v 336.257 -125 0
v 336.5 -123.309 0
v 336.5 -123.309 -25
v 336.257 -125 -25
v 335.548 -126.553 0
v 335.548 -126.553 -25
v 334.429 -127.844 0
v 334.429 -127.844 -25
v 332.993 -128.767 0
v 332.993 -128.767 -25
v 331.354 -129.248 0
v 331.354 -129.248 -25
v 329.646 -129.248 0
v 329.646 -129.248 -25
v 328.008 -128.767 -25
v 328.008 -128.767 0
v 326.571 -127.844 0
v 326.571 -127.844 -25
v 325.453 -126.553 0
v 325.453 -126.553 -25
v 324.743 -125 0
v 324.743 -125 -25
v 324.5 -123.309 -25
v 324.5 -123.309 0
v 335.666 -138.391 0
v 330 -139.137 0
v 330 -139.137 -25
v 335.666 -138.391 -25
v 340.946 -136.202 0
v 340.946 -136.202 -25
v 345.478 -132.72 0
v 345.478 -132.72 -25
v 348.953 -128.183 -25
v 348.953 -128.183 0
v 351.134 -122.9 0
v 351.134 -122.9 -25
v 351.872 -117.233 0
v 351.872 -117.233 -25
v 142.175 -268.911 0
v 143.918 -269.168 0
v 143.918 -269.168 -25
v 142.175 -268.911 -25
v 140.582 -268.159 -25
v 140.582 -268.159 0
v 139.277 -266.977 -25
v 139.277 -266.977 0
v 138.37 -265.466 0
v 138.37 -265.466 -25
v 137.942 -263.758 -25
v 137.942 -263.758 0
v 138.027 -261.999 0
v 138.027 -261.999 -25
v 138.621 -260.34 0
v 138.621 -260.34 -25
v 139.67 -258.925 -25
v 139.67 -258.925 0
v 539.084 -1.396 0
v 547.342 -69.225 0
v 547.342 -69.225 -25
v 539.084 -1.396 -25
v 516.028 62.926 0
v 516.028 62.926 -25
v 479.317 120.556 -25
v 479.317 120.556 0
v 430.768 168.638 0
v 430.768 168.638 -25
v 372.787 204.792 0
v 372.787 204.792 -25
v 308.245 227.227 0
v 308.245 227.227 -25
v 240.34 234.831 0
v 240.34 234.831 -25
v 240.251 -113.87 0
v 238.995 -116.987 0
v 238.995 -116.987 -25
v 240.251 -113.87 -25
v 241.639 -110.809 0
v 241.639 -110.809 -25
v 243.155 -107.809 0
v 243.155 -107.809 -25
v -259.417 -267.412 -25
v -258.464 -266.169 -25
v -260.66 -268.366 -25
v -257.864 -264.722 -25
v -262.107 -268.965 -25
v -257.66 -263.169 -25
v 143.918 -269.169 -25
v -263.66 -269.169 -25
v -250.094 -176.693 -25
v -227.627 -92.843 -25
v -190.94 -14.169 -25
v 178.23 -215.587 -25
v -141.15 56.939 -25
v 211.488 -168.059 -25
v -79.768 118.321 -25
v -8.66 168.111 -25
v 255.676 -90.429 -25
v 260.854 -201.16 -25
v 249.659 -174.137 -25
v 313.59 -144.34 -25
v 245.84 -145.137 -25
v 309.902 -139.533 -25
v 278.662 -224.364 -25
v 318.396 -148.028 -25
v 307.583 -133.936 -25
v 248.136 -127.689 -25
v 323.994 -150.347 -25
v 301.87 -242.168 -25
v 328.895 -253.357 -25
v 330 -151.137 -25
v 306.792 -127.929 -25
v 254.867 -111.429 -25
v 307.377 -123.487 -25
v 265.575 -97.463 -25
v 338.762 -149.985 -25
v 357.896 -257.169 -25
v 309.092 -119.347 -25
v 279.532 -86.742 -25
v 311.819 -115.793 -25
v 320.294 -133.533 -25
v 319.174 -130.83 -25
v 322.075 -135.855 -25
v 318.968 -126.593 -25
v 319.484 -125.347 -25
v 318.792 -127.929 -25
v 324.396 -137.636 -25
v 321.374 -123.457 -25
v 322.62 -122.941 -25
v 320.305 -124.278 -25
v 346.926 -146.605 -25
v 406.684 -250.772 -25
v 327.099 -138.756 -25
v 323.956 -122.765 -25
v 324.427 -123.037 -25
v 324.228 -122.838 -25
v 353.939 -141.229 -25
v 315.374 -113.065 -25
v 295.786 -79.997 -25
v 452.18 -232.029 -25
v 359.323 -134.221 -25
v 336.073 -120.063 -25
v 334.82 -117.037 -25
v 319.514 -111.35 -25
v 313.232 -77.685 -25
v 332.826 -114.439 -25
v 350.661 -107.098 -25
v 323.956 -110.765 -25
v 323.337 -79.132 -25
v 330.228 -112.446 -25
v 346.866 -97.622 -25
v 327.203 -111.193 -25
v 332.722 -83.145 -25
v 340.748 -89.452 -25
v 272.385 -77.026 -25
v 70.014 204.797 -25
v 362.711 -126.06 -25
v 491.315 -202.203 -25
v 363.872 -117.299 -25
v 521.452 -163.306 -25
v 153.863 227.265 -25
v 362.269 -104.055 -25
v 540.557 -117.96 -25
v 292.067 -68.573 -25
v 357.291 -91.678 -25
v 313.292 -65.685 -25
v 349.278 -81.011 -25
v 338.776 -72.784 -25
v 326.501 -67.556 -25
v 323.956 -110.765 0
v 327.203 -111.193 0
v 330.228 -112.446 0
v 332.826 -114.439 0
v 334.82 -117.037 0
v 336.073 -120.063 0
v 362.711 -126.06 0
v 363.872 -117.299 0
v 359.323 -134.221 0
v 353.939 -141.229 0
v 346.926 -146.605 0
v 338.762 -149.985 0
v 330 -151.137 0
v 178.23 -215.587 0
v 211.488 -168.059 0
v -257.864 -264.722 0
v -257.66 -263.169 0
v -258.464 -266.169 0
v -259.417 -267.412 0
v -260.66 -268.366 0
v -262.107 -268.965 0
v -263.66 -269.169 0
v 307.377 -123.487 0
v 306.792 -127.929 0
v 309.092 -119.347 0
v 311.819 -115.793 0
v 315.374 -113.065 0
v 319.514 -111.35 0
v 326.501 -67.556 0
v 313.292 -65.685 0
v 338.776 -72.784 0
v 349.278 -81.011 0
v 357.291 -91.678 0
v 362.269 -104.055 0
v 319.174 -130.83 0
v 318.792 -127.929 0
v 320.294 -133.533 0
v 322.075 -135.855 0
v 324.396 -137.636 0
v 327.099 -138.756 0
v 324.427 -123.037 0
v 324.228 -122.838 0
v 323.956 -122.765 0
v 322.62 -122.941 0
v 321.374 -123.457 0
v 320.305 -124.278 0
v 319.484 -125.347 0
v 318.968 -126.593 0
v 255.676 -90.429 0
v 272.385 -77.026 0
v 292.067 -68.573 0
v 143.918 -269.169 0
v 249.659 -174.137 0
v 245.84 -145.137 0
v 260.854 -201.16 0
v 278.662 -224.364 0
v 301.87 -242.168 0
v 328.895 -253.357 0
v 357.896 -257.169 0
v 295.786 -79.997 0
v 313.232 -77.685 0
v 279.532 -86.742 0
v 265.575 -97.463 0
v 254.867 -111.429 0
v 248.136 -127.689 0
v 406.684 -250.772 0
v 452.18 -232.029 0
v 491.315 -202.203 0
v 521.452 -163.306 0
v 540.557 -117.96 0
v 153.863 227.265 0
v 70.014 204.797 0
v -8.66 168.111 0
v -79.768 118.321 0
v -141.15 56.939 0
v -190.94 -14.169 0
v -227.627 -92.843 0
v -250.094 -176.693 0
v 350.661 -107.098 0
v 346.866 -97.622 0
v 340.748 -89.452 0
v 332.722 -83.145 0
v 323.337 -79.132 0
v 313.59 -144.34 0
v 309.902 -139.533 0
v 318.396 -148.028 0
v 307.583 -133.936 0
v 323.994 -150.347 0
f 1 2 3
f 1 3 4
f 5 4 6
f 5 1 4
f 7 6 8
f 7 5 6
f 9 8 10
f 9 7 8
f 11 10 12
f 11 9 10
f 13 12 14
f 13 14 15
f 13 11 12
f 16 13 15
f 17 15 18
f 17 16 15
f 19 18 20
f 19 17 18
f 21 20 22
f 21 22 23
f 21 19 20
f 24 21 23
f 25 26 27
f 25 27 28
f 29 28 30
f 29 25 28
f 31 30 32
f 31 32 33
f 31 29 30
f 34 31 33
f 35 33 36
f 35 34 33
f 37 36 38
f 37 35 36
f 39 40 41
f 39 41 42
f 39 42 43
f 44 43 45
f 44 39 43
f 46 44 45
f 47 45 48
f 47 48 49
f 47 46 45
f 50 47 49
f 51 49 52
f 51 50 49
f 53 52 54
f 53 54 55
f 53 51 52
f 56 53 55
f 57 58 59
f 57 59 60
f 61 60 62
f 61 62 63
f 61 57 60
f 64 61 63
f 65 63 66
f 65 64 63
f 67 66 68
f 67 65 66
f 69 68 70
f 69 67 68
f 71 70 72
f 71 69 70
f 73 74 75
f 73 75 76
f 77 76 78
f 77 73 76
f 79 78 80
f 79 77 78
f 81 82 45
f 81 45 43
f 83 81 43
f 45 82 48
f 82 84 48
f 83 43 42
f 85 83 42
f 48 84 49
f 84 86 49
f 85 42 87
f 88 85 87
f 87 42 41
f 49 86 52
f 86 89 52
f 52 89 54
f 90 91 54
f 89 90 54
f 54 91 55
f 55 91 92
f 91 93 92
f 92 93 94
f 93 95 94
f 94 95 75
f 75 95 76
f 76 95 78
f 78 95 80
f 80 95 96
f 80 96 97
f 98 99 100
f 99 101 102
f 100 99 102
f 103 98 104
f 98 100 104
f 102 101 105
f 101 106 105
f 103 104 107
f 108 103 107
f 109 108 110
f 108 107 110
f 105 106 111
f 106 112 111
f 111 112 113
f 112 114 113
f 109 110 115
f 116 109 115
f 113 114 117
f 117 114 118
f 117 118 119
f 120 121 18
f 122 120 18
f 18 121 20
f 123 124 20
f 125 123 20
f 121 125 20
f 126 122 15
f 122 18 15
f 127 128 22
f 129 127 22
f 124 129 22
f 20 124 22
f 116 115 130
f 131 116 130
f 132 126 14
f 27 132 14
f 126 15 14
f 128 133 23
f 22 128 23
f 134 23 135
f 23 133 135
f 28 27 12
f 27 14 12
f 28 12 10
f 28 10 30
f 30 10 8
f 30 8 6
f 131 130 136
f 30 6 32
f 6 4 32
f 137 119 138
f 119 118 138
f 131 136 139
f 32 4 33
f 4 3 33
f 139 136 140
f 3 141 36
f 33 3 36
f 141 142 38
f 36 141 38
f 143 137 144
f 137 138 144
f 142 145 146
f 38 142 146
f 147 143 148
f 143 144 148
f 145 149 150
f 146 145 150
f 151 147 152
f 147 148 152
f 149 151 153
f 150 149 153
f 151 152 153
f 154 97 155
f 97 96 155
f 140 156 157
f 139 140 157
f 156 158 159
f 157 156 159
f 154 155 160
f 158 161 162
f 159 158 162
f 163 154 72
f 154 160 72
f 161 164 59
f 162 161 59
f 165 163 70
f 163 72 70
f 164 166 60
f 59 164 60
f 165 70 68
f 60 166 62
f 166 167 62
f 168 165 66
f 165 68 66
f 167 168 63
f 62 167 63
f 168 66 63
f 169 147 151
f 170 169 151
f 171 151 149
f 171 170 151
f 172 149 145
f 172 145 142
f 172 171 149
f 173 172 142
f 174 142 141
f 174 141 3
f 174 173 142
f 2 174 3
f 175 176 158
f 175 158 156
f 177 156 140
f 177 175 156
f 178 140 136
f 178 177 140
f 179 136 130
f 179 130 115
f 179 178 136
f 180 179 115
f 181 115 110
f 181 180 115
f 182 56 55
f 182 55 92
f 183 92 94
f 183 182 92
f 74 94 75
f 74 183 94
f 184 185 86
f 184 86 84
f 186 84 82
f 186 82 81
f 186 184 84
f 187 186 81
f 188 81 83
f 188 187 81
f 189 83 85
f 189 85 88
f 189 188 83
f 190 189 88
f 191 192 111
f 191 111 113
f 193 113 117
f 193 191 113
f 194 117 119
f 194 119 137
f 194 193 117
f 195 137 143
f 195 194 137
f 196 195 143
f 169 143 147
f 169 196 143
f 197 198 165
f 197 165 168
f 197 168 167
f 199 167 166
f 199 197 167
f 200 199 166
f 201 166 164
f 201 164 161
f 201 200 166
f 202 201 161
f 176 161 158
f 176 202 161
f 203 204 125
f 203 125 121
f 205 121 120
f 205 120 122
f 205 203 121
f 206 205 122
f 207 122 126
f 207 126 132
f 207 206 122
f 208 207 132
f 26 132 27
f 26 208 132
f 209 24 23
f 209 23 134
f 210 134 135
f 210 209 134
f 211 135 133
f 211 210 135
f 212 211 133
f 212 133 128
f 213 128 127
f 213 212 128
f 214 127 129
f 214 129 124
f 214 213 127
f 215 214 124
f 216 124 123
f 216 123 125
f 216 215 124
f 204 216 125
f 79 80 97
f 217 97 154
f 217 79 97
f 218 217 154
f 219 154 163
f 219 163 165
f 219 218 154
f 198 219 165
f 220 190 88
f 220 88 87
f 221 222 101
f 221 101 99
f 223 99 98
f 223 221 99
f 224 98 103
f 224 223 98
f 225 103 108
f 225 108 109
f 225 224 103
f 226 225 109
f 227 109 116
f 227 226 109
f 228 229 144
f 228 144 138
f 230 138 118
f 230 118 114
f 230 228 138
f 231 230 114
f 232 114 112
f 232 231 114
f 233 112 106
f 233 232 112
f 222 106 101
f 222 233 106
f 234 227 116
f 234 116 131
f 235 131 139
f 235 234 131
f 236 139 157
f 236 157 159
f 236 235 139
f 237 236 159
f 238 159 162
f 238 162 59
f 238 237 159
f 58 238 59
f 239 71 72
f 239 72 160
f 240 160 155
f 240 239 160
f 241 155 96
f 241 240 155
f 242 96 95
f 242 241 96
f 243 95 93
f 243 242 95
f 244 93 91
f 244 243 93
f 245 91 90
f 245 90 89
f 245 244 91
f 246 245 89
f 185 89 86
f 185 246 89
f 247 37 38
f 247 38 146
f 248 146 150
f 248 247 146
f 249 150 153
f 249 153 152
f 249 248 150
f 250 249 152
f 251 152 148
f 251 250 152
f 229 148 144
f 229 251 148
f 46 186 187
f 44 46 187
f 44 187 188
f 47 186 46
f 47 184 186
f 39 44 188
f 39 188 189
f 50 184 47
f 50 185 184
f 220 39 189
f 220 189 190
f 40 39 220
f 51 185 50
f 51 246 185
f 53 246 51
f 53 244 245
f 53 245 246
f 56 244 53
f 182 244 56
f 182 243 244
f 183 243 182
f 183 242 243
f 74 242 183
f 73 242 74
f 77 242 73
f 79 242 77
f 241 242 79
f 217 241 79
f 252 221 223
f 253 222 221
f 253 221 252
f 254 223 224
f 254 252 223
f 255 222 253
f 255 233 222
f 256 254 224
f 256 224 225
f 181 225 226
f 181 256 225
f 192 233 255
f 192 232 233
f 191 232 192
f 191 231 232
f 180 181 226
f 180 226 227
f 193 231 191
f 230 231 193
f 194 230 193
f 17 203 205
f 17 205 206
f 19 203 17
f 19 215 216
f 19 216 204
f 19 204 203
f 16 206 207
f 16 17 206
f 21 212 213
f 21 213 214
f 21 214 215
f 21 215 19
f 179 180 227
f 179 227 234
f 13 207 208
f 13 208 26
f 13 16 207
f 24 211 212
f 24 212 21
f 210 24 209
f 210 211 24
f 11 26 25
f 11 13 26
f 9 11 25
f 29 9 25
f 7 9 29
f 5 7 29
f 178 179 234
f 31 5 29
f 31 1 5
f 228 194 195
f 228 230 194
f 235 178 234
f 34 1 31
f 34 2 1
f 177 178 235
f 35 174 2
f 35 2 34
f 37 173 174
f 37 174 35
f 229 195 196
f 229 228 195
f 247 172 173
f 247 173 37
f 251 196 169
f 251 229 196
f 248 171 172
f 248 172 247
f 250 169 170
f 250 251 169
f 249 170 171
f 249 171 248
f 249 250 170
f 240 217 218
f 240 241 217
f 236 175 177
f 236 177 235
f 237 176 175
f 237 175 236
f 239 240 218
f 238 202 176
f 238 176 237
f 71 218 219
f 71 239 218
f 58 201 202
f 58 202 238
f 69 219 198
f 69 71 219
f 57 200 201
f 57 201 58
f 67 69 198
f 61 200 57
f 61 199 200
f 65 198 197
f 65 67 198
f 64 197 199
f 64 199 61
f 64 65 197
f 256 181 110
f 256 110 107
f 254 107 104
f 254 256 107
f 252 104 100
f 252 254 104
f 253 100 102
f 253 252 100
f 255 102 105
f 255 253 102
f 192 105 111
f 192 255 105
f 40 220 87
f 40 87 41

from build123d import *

# Parameters (mm, degrees)
F1_DEPTH = 25


with BuildPart() as f1:
    # F0 (on Top) → F1 (new body)
    with BuildSketch(Plane.XY):
        with BuildLine():
            ThreePointArc((306.79226, -127.929437), (311.81948, -115.792653), (323.956265, -110.765432))
            ThreePointArc((323.956265, -110.765432), (332.826212, -114.439485), (336.500265, -123.309432))
            ThreePointArc((336.500265, -123.309432), (330.500265, -129.309432), (324.500265, -123.309432))
            ThreePointArc((324.500265, -123.309432), (324.340931, -122.924766), (323.956265, -122.765432))
            ThreePointArc((323.956265, -122.765432), (320.304762, -124.277934), (318.79226, -127.929437))
            ThreePointArc((318.79226, -127.929437), (322.075007, -135.85469), (330.00026, -139.137437))
            ThreePointArc((330.00026, -139.137437), (345.477622, -132.719745), (351.872235, -117.232833))
            ThreePointArc((351.872235, -117.232833), (340.74764, -89.45185), (313.232341, -77.685459))
            ThreePointArc((313.232341, -77.685459), (265.575313, -97.462858), (245.84026, -145.137437))
            ThreePointArc((245.84026, -145.137437), (278.661963, -224.364314), (357.895707, -257.169435))
            ThreePointArc((357.895707, -257.169435), (491.315491, -202.202906), (547.341988, -69.224752))
            ThreePointArc((547.341988, -69.224752), (456.384064, 145.951907), (240.340265, 234.830562))
            ThreePointArc((240.340265, 234.830562), (-111.798912, 88.969739), (-257.659735, -263.169437))
            ThreePointArc((-257.659735, -263.169437), (-259.417094, -267.412078), (-263.659735, -269.169437))
            Line((-263.659735, -269.169437), (143.917844, -269.169437))
            Line((143.917844, -269.169437), (143.917844, -269.167725))
            ThreePointArc((143.917844, -269.167725), (138.370203, -265.466321), (139.669806, -258.925086))
            ThreePointArc((139.669806, -258.925086), (195.55159, -192.308055), (238.994524, -116.986649))
            ThreePointArc((238.994524, -116.986649), (240.92914, -112.33196), (243.155024, -107.809316))
            ThreePointArc((243.155024, -107.809316), (272.384887, -77.025709), (313.292265, -65.685432))
            ThreePointArc((313.292265, -65.685432), (349.277676, -81.011298), (363.872242, -117.299459))
            ThreePointArc((363.872242, -117.299459), (353.939349, -141.228584), (330.00026, -151.137437))
            ThreePointArc((330.00026, -151.137437), (313.589725, -144.339972), (306.79226, -127.929437))
        make_face()
    extrude(amount=-F1_DEPTH)


solid = f1.part
